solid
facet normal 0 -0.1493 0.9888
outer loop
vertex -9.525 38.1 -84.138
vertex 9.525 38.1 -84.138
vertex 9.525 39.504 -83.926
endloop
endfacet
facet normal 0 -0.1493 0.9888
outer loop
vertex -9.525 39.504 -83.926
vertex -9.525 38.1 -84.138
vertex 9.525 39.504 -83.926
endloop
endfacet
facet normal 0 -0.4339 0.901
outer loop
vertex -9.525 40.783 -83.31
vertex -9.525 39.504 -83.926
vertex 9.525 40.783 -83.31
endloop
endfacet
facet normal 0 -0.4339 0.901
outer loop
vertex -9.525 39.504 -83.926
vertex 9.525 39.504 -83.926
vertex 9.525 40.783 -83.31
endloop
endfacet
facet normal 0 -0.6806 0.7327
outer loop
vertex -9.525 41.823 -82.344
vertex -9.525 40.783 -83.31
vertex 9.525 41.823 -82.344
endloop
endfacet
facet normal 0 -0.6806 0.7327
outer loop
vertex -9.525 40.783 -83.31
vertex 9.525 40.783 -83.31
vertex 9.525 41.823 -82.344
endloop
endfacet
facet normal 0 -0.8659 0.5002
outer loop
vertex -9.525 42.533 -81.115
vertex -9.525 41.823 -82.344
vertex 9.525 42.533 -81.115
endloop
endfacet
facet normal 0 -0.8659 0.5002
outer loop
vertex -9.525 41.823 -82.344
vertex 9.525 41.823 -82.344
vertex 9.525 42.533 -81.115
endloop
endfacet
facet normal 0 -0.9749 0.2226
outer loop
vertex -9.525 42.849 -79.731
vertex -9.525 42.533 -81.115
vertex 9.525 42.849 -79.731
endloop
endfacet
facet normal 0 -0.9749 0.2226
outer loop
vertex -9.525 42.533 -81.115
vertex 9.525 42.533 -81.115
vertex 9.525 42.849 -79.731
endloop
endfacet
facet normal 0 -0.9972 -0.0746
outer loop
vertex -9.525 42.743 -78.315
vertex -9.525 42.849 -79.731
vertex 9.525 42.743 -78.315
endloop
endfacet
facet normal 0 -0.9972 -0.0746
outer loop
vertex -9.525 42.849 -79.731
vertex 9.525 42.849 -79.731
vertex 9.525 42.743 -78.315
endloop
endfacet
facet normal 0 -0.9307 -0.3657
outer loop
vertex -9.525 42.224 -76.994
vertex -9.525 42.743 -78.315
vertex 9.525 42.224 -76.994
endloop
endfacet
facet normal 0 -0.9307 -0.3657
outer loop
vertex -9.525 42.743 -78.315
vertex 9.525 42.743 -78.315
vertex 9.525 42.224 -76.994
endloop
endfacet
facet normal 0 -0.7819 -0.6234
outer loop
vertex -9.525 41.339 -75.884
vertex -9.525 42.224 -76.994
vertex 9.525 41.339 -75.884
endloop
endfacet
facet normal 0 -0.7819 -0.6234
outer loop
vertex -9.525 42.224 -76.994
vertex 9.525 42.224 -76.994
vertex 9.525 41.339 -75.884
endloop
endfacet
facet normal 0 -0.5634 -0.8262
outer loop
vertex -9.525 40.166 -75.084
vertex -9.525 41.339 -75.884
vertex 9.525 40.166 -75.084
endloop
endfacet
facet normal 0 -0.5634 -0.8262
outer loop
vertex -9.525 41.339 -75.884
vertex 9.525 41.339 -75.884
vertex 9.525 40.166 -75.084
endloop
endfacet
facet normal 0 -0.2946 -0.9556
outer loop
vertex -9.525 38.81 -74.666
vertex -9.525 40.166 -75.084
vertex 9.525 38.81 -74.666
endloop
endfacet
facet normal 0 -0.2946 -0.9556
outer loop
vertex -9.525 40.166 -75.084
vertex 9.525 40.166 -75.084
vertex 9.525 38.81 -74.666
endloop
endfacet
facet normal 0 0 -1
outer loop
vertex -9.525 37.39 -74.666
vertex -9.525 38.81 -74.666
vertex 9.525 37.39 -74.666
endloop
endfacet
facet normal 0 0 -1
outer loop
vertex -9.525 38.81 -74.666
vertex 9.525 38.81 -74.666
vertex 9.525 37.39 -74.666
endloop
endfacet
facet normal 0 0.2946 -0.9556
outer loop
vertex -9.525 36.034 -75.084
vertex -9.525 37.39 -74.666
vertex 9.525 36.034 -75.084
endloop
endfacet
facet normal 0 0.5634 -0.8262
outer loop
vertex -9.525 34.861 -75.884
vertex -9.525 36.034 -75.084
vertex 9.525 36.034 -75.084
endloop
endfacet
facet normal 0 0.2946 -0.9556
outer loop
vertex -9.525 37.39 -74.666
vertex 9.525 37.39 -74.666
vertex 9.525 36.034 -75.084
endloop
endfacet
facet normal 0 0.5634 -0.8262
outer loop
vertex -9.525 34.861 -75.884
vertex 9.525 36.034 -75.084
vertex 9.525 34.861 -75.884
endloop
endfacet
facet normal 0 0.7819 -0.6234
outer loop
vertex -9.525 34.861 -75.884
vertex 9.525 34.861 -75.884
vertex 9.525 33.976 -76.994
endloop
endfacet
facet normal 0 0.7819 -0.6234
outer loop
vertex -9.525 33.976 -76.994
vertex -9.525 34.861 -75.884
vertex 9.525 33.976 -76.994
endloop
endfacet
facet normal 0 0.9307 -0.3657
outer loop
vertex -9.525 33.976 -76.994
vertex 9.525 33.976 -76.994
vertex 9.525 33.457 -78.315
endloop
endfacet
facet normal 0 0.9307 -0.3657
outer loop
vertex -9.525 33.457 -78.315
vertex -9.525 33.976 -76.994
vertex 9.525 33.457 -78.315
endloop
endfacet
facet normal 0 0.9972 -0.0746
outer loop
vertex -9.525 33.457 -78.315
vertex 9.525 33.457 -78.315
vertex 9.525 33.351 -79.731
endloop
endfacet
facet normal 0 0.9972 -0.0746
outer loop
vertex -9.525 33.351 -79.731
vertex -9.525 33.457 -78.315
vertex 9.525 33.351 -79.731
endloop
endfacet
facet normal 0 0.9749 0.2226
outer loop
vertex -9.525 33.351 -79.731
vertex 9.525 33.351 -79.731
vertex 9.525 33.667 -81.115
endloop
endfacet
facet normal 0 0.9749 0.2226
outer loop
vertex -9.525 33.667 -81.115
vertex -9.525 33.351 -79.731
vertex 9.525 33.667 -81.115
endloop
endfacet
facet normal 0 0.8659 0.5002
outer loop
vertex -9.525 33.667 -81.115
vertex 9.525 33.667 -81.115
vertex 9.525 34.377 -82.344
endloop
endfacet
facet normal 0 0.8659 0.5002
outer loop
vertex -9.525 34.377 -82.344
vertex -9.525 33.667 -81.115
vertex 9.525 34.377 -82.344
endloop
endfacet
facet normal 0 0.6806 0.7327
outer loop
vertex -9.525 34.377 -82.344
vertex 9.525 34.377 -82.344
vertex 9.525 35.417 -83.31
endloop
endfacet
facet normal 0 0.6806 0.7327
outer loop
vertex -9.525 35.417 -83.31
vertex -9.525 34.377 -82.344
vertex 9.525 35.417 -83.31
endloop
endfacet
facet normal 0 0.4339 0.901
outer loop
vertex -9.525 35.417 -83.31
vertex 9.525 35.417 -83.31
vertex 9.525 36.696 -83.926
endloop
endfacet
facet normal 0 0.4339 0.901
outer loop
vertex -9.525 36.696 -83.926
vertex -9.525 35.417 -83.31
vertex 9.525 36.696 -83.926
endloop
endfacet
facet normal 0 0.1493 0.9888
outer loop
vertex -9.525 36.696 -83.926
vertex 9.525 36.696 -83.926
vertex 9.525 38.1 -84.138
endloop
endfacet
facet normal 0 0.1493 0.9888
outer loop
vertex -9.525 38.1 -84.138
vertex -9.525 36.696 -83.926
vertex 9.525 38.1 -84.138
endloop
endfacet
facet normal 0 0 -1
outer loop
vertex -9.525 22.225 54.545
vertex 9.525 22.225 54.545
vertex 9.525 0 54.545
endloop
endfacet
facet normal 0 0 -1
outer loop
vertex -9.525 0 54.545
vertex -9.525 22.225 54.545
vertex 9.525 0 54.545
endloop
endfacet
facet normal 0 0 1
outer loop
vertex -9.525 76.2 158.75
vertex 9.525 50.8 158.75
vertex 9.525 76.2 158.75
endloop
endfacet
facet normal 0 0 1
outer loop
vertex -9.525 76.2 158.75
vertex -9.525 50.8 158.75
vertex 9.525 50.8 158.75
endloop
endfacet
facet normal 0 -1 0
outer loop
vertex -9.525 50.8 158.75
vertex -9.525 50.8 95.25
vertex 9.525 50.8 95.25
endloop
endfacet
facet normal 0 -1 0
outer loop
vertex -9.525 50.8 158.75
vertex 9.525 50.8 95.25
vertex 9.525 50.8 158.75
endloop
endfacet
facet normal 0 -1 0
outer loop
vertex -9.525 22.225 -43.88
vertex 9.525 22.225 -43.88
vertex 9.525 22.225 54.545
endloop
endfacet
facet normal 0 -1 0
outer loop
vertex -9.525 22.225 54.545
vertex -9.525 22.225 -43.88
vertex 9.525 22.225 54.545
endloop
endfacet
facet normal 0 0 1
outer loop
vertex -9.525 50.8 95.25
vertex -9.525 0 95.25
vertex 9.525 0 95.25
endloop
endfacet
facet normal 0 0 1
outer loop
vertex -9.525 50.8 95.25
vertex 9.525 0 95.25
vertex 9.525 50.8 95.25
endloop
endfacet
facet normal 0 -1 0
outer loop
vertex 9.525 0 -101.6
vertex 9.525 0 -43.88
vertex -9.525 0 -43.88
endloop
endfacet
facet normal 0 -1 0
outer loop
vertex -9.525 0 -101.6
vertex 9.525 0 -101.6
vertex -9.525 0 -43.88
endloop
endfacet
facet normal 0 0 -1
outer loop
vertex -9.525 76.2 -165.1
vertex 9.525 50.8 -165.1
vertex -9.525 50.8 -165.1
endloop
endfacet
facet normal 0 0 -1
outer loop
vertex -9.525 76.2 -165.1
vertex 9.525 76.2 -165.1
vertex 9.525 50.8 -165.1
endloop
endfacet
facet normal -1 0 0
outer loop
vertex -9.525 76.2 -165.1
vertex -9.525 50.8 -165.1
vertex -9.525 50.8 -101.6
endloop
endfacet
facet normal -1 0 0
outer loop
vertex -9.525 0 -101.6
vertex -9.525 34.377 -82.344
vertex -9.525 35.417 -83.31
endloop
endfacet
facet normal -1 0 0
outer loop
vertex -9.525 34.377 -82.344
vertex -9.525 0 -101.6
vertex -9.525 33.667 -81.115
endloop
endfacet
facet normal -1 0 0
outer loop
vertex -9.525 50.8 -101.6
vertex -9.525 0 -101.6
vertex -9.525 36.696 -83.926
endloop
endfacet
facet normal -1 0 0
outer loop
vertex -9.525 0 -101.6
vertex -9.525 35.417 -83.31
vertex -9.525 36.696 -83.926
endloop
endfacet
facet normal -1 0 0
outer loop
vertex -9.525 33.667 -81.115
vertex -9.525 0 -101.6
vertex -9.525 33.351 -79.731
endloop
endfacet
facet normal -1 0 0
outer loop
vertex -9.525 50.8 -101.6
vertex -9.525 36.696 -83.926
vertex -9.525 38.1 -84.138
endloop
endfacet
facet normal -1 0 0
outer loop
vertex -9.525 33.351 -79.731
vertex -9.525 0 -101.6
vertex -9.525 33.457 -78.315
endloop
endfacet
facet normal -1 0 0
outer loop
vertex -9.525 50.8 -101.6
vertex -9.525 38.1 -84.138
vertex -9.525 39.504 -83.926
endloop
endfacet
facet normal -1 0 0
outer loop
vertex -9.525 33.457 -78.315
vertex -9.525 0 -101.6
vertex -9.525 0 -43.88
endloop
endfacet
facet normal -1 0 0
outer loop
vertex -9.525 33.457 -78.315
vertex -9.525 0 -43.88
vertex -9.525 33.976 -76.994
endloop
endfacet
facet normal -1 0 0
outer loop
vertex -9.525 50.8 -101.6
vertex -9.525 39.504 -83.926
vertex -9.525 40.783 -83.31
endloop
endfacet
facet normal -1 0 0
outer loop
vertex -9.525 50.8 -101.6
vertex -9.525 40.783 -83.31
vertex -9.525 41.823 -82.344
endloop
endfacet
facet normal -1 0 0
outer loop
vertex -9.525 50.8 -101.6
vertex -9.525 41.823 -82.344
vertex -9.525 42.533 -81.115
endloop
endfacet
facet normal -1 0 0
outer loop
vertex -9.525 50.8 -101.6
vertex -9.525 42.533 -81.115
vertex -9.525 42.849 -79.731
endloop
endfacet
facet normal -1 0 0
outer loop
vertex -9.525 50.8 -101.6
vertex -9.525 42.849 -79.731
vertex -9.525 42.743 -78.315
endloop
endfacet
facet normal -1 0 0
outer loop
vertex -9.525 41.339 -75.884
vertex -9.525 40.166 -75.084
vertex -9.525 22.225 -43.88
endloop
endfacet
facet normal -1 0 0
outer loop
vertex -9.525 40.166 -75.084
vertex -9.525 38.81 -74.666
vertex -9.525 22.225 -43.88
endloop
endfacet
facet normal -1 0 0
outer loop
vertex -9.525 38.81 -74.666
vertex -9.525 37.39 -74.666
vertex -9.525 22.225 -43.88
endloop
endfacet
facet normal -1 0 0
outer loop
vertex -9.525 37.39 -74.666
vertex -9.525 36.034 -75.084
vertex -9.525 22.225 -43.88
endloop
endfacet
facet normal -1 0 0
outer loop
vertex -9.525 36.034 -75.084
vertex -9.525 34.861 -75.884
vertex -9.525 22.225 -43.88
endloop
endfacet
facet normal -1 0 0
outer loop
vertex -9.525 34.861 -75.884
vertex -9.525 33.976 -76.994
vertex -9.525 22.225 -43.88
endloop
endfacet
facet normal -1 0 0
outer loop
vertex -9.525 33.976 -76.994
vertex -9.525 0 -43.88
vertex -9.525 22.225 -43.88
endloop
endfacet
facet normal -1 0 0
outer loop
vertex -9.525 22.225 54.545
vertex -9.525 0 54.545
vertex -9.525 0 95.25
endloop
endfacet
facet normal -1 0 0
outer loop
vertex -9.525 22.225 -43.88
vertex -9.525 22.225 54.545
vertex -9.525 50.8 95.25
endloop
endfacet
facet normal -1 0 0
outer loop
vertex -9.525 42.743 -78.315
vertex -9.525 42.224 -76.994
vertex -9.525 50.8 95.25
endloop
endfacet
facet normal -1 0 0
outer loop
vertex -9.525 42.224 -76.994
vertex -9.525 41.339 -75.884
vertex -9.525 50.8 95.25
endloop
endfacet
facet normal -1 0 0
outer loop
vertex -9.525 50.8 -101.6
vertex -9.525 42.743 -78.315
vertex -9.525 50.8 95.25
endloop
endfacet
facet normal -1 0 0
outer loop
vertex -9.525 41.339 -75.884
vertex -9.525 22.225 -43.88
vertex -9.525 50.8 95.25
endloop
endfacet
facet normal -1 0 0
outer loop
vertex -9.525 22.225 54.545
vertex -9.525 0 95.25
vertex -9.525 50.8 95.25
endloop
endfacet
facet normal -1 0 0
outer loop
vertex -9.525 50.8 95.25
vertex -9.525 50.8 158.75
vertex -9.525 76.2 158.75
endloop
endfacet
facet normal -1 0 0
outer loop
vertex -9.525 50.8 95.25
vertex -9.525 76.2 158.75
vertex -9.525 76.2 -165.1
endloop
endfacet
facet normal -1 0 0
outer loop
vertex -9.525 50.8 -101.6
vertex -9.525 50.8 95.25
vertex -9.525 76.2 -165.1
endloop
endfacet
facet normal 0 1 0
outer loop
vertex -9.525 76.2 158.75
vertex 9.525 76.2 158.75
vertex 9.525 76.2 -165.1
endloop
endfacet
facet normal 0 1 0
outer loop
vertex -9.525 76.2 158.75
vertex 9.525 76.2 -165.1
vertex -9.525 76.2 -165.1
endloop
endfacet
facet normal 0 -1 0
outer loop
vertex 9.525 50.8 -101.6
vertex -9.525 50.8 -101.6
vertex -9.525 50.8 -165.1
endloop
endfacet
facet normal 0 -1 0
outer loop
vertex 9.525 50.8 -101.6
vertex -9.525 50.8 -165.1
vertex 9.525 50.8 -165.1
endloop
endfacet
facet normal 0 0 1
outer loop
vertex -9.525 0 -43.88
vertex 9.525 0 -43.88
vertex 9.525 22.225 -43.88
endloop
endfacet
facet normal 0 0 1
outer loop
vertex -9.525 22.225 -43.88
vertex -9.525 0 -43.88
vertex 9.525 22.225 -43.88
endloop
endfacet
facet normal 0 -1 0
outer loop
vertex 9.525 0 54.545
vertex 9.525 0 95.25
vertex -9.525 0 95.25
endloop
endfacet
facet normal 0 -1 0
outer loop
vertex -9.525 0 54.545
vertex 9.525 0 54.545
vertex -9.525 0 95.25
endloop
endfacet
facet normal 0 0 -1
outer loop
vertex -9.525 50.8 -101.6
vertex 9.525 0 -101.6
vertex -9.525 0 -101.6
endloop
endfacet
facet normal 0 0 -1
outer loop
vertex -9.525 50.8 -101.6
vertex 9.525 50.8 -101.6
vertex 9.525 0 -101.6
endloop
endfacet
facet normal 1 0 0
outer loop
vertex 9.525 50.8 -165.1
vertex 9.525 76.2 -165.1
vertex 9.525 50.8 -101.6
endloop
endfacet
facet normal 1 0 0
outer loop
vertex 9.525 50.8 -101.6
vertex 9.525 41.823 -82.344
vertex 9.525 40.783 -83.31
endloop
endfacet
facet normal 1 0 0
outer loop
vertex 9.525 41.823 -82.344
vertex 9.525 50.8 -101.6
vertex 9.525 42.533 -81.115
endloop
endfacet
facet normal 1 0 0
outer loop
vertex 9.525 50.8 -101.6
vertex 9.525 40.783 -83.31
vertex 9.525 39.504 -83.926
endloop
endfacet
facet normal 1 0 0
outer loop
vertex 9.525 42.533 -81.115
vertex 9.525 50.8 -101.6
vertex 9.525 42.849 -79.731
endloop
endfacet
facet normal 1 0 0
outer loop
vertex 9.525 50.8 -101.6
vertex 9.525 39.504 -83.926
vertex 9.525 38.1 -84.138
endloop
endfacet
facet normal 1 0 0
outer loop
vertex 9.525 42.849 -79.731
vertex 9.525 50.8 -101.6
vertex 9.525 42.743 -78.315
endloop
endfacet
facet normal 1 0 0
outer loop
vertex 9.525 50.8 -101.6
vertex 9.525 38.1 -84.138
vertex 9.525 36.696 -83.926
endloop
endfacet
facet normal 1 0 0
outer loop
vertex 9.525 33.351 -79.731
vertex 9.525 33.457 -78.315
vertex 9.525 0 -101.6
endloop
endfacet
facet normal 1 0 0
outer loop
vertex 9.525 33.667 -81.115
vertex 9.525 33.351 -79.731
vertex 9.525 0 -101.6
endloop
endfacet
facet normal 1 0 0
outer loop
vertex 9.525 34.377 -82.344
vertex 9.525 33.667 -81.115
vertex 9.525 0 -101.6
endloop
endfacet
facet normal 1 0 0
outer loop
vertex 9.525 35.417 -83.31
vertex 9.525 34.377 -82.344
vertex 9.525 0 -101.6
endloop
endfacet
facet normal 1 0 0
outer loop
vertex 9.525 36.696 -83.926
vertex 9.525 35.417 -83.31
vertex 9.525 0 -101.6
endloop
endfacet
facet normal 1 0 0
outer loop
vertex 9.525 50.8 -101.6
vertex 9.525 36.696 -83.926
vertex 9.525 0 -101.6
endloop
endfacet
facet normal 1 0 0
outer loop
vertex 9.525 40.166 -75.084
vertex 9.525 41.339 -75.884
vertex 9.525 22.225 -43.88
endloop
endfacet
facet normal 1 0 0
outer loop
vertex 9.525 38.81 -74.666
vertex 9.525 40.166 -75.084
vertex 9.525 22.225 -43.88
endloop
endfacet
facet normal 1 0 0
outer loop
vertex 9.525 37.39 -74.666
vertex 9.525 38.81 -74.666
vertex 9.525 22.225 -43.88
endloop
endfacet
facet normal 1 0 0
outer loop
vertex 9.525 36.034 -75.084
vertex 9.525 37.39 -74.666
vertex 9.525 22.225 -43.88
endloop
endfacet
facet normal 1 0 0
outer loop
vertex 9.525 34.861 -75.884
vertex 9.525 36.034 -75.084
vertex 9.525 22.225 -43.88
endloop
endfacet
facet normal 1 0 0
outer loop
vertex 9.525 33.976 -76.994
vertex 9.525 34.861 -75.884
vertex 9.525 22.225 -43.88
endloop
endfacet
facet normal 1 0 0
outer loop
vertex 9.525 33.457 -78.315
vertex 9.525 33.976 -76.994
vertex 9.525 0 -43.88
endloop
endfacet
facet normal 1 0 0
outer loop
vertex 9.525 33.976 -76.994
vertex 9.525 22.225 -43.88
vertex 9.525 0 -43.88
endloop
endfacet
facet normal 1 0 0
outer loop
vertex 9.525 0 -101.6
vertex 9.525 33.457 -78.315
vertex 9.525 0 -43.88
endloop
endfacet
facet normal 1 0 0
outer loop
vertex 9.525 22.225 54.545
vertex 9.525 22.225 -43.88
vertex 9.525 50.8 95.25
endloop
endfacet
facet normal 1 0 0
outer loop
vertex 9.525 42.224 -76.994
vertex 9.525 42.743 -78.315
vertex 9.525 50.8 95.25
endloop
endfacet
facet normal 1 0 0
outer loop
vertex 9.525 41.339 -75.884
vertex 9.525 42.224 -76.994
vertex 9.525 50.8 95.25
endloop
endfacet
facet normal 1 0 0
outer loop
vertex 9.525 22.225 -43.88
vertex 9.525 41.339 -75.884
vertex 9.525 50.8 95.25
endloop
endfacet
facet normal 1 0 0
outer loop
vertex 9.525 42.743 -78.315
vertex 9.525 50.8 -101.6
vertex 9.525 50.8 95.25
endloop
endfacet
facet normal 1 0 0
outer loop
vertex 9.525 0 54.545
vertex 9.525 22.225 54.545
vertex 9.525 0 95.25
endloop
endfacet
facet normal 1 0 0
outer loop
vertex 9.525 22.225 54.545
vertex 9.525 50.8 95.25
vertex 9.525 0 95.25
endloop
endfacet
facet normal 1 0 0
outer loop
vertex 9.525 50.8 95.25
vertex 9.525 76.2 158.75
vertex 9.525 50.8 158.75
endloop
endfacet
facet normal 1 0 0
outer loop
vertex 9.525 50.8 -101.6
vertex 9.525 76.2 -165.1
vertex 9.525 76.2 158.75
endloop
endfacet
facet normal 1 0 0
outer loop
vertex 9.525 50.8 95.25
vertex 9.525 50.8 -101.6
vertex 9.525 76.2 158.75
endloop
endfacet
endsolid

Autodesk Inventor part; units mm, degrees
ref_plane "YZ Plane" through (0, 0, 0) normal (1, 0, 0) x (0, 1, 0)
ref_plane "XZ Plane" through (0, 0, 0) normal (0, 1, 0) x (-1, 0, 0)
ref_plane "XY Plane" through (0, 0, 0) normal (0, 0, 1) x (1, 0, 0)
sketch "Sketch2" plane through (0, 0, 0) normal (1, 0, 0) x (0, 1, 0)
  line L0 (0, 0) -> (0, 95.25)
  line L1 (0, 95.25) -> (50.8, 95.25)
  line L2 (50.8, 95.25) -> (50.8, 158.75)
  line L3 (50.8, 158.75) -> (76.2, 158.75)
  line L4 (76.2, 158.75) -> (76.2, 15.0657)
  line L5 (76.2, 15.0657) -> (76.2, 0)
  line L6 (76.2, 0) -> (0, 0) construction
  line L7 (0, 0) -> (0, -95.25)
  line L8 (0, -95.25) -> (50.8, -95.25)
  line L9 (50.8, -95.25) -> (50.8, -158.75)
  line L10 (50.8, -158.75) -> (76.2, -158.75)
  line L11 (76.2, -158.75) -> (76.2, -15.0657)
  line L12 (76.2, -15.0657) -> (76.2, 0)
  dimension "d5" = 50.8
  dimension "d6" = 25.4
  dimension "d8" = 63.5
  dimension "d9" = 95.25
extrude "Extrusion1" add sketch "Sketch2" along normal mid plane 19.05
sketch "Sketch3" plane through (9.525, 50.8, -95.25) normal (0, 0, -1) x (-1, 0, 0)
  line L0 (19.05, 0) -> (19.05, 25.4) projected
  line L1 (0, -50.8) -> (19.05, -50.8)
  line L2 (19.05, -50.8) -> (19.05, 0)
  line L3 (19.05, 0) -> (0, 0)
  line L4 (0, 0) -> (0, -50.8)
  point P0 (9.525, -50.8)
extrude "Extrusion2" add sketch "Sketch3" along normal blind 6.35
sketch "Sketch4" plane through (9.525, 76.2, -158.75) normal (0, 0, -1) x (-1, 0, 0)
  line L0 (0, 0) -> (0, -25.4) projected
  line L1 (19.05, -25.4) -> (19.05, 0) projected
  line L2 (0, 0) -> (19.05, 0)
  line L3 (19.05, 0) -> (19.05, -25.4)
  line L4 (19.05, -25.4) -> (0, -25.4)
  line L5 (0, -25.4) -> (0, 0)
  point P0 (9.525, -76.2)
extrude "Extrusion3" add sketch "Sketch4" along normal blind 6.35
sketch "Sketch6" plane through (9.525, 0, 0) normal (1, 0, 0) x (0, 0, -1)
  line L0 (-95.25, 50.8) -> (-95.25, 0) construction
  line L1 (-95.25, 38.1) -> (101.6, 38.1) construction
  line L2 (101.6, 50.8) -> (101.6, 0) construction
  line L3 (-158.75, 76.2) -> (165.1, 76.2) construction
  circle A0 centre (79.375, 38.1) radius 4.7625
  line L4 (165.1, 76.2) -> (165.1, 50.8) projected
  point P0 (0, 0)
  dimension "d28" = 38.1
  dimension "d29" = 85.725
  dimension "d30" = 9.525
extrude "Extrusion5" cut sketch "Sketch6" against normal through all
sketch "Sketch7" plane through (9.525, 0, 0) normal (1, 0, 0) x (0, 0, -1)
  circle A0 centre (79.375, 38.1) radius 4.7625 projected
  line L0 (-95.25, 0) -> (101.6, 0) projected
  line L1 (-95.25, 0) -> (-95.25, 50.8) projected
  line L2 (-95.25, 50.8) -> (-158.75, 50.8) projected
  line L3 (-158.75, 50.8) -> (-158.75, 76.2) projected
  line L4 (-158.75, 76.2) -> (165.1, 76.2) projected
  line L5 (165.1, 50.8) -> (165.1, 76.2) projected
  line L6 (101.6, 50.8) -> (165.1, 50.8) projected
  line L7 (101.6, 0) -> (101.6, 50.8) projected
  line L8 (-95.25, 0) -> (101.6, 0) projected
  line L9 (-54.5452, 0) -> (43.8798, 0)
  line L10 (43.8798, 0) -> (43.8798, 22.225)
  line L11 (43.8798, 22.225) -> (-54.5452, 22.225)
  line L12 (-54.5452, 22.225) -> (-54.5452, 0)
  point P0 (0, 0)
  dimension "d33" = 98.425
  dimension "d34" = 22.225
extrude "Extrusion6" cut sketch "Sketch7" against normal through all contours L12 L11 L10 L0
properties part number "SpanRearAndMiddleSupport" material "Aluminum 6061"
